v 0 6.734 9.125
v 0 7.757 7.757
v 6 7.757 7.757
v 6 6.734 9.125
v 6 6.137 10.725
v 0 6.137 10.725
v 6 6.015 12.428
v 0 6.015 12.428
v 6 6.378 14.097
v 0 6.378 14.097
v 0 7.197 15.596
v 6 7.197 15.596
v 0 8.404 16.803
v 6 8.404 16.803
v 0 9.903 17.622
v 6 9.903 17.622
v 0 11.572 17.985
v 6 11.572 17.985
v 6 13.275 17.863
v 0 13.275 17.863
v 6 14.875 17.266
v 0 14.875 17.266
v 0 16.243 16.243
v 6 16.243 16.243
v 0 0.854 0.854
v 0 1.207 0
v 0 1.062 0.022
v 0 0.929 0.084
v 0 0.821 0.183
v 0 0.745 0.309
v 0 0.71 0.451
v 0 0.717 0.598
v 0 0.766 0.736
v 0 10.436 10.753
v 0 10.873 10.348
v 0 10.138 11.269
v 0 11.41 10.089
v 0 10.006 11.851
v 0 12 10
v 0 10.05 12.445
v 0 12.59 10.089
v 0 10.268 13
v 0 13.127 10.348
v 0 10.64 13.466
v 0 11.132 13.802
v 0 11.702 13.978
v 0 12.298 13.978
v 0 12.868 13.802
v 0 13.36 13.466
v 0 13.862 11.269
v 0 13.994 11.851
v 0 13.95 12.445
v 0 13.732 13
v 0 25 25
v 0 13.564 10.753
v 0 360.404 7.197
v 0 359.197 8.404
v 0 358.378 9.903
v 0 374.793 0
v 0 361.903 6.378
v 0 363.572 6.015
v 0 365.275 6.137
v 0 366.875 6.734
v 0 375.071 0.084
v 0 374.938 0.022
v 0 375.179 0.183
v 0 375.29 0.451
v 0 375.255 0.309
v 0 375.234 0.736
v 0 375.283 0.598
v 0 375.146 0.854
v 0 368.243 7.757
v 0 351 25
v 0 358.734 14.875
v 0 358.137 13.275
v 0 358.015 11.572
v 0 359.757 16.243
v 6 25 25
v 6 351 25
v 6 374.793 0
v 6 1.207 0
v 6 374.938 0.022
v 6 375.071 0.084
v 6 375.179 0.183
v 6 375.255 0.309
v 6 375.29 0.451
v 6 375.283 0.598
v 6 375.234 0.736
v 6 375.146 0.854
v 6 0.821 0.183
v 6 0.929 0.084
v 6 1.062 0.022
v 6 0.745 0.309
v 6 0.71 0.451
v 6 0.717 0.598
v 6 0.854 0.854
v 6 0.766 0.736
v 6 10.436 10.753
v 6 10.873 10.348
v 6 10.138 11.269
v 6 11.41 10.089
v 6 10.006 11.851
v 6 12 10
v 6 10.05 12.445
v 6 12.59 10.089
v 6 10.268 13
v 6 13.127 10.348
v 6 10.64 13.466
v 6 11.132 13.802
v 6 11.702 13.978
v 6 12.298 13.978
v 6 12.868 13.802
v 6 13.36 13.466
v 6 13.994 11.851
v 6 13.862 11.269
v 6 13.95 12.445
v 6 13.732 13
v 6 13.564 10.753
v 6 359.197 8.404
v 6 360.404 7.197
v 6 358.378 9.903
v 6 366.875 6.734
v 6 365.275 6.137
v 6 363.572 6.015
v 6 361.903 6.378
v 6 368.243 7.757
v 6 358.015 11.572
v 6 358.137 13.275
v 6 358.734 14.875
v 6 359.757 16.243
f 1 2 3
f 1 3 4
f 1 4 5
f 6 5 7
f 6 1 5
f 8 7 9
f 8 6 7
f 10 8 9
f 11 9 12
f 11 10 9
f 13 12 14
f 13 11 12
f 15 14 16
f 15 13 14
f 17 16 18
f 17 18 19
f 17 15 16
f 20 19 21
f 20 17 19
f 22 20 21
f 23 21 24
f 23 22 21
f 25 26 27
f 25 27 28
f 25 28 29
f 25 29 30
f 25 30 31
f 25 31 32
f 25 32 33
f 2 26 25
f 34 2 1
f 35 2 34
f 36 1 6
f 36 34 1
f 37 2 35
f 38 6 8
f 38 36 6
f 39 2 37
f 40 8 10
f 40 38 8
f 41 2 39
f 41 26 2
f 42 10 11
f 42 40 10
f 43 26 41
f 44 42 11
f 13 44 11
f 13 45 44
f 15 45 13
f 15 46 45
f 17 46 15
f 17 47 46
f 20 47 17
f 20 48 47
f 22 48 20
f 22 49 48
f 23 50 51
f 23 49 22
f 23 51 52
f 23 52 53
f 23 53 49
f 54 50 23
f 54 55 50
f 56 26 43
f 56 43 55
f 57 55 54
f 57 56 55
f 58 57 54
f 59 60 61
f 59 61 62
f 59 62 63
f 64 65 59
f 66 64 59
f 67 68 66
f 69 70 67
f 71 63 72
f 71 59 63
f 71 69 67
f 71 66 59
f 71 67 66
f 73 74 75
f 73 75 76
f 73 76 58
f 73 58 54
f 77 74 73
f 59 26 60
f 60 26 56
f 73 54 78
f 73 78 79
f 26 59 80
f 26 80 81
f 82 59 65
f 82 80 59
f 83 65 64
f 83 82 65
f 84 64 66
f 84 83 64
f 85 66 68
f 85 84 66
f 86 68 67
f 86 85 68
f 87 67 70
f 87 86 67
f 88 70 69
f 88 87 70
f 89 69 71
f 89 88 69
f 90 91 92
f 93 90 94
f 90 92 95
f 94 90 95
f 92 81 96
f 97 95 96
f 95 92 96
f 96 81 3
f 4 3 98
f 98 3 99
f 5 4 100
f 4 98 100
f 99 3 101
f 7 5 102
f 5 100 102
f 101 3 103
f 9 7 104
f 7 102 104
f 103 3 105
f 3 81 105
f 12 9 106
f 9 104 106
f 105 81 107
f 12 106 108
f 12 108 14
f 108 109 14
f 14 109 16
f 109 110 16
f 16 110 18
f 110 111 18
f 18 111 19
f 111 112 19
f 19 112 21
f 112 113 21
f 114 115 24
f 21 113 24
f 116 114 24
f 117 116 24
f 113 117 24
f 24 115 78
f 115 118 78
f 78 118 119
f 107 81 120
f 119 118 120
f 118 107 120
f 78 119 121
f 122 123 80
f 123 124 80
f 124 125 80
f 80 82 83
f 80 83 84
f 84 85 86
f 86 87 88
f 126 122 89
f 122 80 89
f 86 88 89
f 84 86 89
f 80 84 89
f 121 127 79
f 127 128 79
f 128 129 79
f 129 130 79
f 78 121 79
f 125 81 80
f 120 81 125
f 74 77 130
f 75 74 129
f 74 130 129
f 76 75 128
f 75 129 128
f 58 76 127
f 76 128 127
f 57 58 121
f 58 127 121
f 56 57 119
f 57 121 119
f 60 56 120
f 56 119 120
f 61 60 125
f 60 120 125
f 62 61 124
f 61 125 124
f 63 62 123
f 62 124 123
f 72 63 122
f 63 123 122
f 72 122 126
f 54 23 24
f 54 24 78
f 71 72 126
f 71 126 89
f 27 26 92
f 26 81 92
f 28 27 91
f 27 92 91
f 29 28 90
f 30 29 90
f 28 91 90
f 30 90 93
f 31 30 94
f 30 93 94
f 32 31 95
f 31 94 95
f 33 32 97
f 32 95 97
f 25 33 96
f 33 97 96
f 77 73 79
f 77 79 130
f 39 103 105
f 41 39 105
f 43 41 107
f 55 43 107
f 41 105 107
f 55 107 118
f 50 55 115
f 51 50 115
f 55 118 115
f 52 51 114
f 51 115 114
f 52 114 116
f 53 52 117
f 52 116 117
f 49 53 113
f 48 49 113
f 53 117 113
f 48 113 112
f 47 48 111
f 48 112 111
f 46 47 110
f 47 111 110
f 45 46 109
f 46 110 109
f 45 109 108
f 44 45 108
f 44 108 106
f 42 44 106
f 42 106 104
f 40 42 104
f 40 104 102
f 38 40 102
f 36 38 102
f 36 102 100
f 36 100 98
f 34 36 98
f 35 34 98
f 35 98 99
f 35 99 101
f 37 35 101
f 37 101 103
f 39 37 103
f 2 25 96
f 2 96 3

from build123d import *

# Parameters (mm, degrees)
BOSS_EXTRUDE1_DEPTH = 6
FILLET1_R           = 0.5
SKETCH4_R           = 6
BOSS_EXTRUDE2_DEPTH = 6
SKETCH3_R           = 6
SKETCH3_R_2         = 2
CUT_EXTRUDE1_DEPTH  = 377.172507901


with BuildPart() as part:
    # Sketch2 → Boss-Extrude1 (new body)
    with BuildSketch(Plane(origin=(0, 0, 0), x_dir=(0, 0, -1), z_dir=(1, 0, 0))):
        Polygon((0, 376), (0, 0), (-25, 25), (-25, 351), align=None)
    extrude(amount=BOSS_EXTRUDE1_DEPTH)

    # Fillet1
    fillet1_edges = [part.edges().sort_by_distance(p)[0] for p in [
        (3, 376, 0),
        (3, 0, 0),
    ]]
    fillet(fillet1_edges, radius=FILLET1_R)

    # Sketch4 → Boss-Extrude2 (add)
    with BuildSketch(Plane.ZY):
        with Locations((12, 12)):
            Circle(SKETCH4_R)
    extrude(amount=-BOSS_EXTRUDE2_DEPTH)

    # Sketch3 → Cut-Extrude1 (cut, through all)
    with BuildSketch(Plane(origin=(6, 0, 0), x_dir=(0, 0, -1), z_dir=(1, 0, 0))):
        with Locations((-12, 364)):
            Circle(SKETCH3_R)
        with Locations((-12, 12)):
            Circle(SKETCH3_R_2)
    extrude(amount=-CUT_EXTRUDE1_DEPTH, mode=Mode.SUBTRACT)


solid = part.part
